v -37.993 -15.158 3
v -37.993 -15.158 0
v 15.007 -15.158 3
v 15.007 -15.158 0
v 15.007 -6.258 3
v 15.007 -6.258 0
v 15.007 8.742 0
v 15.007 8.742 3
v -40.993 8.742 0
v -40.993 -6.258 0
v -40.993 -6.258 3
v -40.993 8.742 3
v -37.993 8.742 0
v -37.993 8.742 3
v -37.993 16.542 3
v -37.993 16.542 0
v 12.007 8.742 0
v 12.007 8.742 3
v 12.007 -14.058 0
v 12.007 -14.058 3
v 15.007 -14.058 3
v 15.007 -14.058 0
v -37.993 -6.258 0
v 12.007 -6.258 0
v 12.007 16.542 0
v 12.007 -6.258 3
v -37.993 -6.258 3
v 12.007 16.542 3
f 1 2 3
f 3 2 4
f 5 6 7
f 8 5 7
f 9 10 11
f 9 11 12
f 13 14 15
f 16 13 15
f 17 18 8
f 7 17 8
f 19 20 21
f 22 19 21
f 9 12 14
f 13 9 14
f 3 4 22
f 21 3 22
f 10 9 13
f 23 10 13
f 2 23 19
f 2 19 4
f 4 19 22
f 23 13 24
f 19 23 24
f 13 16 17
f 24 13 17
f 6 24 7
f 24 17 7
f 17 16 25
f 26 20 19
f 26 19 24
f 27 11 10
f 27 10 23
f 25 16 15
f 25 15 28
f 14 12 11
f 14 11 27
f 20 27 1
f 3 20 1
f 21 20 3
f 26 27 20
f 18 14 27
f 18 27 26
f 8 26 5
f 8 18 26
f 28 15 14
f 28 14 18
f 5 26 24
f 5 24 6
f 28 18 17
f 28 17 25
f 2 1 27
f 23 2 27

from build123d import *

# Parameters (mm, degrees)
SKETCH1_W           = 56
SKETCH1_H           = 31.7
BOSS_EXTRUDE1_DEPTH = 3
SKETCH2_W           = 3
SKETCH2_H           = 7.8
CUT_EXTRUDE1_DEPTH  = 45.306907356
LPATTERN1_COUNT     = 2
LPATTERN1_PITCH     = 22.8
SKETCH3_W           = 3
SKETCH3_H           = 7.8
CUT_EXTRUDE2_DEPTH  = 45.306907356
LPATTERN2_COUNT     = 4
LPATTERN2_PITCH     = 22.8
SKETCH6_W           = 3
SKETCH6_H           = 1.1
CUT_EXTRUDE3_DEPTH  = 10


with BuildPart() as part:
    # Sketch1 → Boss-Extrude1 (new body)
    with BuildSketch(Plane.XY):
        with Locations((-12.993460648, 0.692013889)):
            Rectangle(SKETCH1_W, SKETCH1_H)
    extrude(amount=BOSS_EXTRUDE1_DEPTH)

    # Sketch2 → Cut-Extrude1 (cut, through all)
    with BuildSketch(Plane.XY.offset(3)):
        with Locations((-39.493460648, 12.642013889)):
            Rectangle(SKETCH2_W, SKETCH2_H)
    cut_extrude1 = extrude(amount=-CUT_EXTRUDE1_DEPTH, mode=Mode.SUBTRACT)

    # LPattern1: Cut-Extrude1 ×2
    with Locations(*[(0, -i * LPATTERN1_PITCH, 0) for i in range(1, LPATTERN1_COUNT)]):
        add(cut_extrude1, mode=Mode.SUBTRACT)

    # Sketch3 → Cut-Extrude2 (cut, through all)
    with BuildSketch(Plane.XY.offset(3)):
        with Locations((13.506539352, 12.642013889)):
            Rectangle(SKETCH3_W, SKETCH3_H)
    cut_extrude2 = extrude(amount=-CUT_EXTRUDE2_DEPTH, mode=Mode.SUBTRACT)

    # LPattern2: Cut-Extrude2 ×4
    with Locations(*[(0, -i * LPATTERN2_PITCH, 0) for i in range(1, LPATTERN2_COUNT)]):
        add(cut_extrude2, mode=Mode.SUBTRACT)

    # Sketch6 → Cut-Extrude3 (cut)
    with BuildSketch(Plane.XY.offset(3)):
        with Locations((-39.493460648, -14.607986111)):
            Rectangle(SKETCH6_W, SKETCH6_H)
    extrude(amount=-CUT_EXTRUDE3_DEPTH, mode=Mode.SUBTRACT)


solid = part.part
